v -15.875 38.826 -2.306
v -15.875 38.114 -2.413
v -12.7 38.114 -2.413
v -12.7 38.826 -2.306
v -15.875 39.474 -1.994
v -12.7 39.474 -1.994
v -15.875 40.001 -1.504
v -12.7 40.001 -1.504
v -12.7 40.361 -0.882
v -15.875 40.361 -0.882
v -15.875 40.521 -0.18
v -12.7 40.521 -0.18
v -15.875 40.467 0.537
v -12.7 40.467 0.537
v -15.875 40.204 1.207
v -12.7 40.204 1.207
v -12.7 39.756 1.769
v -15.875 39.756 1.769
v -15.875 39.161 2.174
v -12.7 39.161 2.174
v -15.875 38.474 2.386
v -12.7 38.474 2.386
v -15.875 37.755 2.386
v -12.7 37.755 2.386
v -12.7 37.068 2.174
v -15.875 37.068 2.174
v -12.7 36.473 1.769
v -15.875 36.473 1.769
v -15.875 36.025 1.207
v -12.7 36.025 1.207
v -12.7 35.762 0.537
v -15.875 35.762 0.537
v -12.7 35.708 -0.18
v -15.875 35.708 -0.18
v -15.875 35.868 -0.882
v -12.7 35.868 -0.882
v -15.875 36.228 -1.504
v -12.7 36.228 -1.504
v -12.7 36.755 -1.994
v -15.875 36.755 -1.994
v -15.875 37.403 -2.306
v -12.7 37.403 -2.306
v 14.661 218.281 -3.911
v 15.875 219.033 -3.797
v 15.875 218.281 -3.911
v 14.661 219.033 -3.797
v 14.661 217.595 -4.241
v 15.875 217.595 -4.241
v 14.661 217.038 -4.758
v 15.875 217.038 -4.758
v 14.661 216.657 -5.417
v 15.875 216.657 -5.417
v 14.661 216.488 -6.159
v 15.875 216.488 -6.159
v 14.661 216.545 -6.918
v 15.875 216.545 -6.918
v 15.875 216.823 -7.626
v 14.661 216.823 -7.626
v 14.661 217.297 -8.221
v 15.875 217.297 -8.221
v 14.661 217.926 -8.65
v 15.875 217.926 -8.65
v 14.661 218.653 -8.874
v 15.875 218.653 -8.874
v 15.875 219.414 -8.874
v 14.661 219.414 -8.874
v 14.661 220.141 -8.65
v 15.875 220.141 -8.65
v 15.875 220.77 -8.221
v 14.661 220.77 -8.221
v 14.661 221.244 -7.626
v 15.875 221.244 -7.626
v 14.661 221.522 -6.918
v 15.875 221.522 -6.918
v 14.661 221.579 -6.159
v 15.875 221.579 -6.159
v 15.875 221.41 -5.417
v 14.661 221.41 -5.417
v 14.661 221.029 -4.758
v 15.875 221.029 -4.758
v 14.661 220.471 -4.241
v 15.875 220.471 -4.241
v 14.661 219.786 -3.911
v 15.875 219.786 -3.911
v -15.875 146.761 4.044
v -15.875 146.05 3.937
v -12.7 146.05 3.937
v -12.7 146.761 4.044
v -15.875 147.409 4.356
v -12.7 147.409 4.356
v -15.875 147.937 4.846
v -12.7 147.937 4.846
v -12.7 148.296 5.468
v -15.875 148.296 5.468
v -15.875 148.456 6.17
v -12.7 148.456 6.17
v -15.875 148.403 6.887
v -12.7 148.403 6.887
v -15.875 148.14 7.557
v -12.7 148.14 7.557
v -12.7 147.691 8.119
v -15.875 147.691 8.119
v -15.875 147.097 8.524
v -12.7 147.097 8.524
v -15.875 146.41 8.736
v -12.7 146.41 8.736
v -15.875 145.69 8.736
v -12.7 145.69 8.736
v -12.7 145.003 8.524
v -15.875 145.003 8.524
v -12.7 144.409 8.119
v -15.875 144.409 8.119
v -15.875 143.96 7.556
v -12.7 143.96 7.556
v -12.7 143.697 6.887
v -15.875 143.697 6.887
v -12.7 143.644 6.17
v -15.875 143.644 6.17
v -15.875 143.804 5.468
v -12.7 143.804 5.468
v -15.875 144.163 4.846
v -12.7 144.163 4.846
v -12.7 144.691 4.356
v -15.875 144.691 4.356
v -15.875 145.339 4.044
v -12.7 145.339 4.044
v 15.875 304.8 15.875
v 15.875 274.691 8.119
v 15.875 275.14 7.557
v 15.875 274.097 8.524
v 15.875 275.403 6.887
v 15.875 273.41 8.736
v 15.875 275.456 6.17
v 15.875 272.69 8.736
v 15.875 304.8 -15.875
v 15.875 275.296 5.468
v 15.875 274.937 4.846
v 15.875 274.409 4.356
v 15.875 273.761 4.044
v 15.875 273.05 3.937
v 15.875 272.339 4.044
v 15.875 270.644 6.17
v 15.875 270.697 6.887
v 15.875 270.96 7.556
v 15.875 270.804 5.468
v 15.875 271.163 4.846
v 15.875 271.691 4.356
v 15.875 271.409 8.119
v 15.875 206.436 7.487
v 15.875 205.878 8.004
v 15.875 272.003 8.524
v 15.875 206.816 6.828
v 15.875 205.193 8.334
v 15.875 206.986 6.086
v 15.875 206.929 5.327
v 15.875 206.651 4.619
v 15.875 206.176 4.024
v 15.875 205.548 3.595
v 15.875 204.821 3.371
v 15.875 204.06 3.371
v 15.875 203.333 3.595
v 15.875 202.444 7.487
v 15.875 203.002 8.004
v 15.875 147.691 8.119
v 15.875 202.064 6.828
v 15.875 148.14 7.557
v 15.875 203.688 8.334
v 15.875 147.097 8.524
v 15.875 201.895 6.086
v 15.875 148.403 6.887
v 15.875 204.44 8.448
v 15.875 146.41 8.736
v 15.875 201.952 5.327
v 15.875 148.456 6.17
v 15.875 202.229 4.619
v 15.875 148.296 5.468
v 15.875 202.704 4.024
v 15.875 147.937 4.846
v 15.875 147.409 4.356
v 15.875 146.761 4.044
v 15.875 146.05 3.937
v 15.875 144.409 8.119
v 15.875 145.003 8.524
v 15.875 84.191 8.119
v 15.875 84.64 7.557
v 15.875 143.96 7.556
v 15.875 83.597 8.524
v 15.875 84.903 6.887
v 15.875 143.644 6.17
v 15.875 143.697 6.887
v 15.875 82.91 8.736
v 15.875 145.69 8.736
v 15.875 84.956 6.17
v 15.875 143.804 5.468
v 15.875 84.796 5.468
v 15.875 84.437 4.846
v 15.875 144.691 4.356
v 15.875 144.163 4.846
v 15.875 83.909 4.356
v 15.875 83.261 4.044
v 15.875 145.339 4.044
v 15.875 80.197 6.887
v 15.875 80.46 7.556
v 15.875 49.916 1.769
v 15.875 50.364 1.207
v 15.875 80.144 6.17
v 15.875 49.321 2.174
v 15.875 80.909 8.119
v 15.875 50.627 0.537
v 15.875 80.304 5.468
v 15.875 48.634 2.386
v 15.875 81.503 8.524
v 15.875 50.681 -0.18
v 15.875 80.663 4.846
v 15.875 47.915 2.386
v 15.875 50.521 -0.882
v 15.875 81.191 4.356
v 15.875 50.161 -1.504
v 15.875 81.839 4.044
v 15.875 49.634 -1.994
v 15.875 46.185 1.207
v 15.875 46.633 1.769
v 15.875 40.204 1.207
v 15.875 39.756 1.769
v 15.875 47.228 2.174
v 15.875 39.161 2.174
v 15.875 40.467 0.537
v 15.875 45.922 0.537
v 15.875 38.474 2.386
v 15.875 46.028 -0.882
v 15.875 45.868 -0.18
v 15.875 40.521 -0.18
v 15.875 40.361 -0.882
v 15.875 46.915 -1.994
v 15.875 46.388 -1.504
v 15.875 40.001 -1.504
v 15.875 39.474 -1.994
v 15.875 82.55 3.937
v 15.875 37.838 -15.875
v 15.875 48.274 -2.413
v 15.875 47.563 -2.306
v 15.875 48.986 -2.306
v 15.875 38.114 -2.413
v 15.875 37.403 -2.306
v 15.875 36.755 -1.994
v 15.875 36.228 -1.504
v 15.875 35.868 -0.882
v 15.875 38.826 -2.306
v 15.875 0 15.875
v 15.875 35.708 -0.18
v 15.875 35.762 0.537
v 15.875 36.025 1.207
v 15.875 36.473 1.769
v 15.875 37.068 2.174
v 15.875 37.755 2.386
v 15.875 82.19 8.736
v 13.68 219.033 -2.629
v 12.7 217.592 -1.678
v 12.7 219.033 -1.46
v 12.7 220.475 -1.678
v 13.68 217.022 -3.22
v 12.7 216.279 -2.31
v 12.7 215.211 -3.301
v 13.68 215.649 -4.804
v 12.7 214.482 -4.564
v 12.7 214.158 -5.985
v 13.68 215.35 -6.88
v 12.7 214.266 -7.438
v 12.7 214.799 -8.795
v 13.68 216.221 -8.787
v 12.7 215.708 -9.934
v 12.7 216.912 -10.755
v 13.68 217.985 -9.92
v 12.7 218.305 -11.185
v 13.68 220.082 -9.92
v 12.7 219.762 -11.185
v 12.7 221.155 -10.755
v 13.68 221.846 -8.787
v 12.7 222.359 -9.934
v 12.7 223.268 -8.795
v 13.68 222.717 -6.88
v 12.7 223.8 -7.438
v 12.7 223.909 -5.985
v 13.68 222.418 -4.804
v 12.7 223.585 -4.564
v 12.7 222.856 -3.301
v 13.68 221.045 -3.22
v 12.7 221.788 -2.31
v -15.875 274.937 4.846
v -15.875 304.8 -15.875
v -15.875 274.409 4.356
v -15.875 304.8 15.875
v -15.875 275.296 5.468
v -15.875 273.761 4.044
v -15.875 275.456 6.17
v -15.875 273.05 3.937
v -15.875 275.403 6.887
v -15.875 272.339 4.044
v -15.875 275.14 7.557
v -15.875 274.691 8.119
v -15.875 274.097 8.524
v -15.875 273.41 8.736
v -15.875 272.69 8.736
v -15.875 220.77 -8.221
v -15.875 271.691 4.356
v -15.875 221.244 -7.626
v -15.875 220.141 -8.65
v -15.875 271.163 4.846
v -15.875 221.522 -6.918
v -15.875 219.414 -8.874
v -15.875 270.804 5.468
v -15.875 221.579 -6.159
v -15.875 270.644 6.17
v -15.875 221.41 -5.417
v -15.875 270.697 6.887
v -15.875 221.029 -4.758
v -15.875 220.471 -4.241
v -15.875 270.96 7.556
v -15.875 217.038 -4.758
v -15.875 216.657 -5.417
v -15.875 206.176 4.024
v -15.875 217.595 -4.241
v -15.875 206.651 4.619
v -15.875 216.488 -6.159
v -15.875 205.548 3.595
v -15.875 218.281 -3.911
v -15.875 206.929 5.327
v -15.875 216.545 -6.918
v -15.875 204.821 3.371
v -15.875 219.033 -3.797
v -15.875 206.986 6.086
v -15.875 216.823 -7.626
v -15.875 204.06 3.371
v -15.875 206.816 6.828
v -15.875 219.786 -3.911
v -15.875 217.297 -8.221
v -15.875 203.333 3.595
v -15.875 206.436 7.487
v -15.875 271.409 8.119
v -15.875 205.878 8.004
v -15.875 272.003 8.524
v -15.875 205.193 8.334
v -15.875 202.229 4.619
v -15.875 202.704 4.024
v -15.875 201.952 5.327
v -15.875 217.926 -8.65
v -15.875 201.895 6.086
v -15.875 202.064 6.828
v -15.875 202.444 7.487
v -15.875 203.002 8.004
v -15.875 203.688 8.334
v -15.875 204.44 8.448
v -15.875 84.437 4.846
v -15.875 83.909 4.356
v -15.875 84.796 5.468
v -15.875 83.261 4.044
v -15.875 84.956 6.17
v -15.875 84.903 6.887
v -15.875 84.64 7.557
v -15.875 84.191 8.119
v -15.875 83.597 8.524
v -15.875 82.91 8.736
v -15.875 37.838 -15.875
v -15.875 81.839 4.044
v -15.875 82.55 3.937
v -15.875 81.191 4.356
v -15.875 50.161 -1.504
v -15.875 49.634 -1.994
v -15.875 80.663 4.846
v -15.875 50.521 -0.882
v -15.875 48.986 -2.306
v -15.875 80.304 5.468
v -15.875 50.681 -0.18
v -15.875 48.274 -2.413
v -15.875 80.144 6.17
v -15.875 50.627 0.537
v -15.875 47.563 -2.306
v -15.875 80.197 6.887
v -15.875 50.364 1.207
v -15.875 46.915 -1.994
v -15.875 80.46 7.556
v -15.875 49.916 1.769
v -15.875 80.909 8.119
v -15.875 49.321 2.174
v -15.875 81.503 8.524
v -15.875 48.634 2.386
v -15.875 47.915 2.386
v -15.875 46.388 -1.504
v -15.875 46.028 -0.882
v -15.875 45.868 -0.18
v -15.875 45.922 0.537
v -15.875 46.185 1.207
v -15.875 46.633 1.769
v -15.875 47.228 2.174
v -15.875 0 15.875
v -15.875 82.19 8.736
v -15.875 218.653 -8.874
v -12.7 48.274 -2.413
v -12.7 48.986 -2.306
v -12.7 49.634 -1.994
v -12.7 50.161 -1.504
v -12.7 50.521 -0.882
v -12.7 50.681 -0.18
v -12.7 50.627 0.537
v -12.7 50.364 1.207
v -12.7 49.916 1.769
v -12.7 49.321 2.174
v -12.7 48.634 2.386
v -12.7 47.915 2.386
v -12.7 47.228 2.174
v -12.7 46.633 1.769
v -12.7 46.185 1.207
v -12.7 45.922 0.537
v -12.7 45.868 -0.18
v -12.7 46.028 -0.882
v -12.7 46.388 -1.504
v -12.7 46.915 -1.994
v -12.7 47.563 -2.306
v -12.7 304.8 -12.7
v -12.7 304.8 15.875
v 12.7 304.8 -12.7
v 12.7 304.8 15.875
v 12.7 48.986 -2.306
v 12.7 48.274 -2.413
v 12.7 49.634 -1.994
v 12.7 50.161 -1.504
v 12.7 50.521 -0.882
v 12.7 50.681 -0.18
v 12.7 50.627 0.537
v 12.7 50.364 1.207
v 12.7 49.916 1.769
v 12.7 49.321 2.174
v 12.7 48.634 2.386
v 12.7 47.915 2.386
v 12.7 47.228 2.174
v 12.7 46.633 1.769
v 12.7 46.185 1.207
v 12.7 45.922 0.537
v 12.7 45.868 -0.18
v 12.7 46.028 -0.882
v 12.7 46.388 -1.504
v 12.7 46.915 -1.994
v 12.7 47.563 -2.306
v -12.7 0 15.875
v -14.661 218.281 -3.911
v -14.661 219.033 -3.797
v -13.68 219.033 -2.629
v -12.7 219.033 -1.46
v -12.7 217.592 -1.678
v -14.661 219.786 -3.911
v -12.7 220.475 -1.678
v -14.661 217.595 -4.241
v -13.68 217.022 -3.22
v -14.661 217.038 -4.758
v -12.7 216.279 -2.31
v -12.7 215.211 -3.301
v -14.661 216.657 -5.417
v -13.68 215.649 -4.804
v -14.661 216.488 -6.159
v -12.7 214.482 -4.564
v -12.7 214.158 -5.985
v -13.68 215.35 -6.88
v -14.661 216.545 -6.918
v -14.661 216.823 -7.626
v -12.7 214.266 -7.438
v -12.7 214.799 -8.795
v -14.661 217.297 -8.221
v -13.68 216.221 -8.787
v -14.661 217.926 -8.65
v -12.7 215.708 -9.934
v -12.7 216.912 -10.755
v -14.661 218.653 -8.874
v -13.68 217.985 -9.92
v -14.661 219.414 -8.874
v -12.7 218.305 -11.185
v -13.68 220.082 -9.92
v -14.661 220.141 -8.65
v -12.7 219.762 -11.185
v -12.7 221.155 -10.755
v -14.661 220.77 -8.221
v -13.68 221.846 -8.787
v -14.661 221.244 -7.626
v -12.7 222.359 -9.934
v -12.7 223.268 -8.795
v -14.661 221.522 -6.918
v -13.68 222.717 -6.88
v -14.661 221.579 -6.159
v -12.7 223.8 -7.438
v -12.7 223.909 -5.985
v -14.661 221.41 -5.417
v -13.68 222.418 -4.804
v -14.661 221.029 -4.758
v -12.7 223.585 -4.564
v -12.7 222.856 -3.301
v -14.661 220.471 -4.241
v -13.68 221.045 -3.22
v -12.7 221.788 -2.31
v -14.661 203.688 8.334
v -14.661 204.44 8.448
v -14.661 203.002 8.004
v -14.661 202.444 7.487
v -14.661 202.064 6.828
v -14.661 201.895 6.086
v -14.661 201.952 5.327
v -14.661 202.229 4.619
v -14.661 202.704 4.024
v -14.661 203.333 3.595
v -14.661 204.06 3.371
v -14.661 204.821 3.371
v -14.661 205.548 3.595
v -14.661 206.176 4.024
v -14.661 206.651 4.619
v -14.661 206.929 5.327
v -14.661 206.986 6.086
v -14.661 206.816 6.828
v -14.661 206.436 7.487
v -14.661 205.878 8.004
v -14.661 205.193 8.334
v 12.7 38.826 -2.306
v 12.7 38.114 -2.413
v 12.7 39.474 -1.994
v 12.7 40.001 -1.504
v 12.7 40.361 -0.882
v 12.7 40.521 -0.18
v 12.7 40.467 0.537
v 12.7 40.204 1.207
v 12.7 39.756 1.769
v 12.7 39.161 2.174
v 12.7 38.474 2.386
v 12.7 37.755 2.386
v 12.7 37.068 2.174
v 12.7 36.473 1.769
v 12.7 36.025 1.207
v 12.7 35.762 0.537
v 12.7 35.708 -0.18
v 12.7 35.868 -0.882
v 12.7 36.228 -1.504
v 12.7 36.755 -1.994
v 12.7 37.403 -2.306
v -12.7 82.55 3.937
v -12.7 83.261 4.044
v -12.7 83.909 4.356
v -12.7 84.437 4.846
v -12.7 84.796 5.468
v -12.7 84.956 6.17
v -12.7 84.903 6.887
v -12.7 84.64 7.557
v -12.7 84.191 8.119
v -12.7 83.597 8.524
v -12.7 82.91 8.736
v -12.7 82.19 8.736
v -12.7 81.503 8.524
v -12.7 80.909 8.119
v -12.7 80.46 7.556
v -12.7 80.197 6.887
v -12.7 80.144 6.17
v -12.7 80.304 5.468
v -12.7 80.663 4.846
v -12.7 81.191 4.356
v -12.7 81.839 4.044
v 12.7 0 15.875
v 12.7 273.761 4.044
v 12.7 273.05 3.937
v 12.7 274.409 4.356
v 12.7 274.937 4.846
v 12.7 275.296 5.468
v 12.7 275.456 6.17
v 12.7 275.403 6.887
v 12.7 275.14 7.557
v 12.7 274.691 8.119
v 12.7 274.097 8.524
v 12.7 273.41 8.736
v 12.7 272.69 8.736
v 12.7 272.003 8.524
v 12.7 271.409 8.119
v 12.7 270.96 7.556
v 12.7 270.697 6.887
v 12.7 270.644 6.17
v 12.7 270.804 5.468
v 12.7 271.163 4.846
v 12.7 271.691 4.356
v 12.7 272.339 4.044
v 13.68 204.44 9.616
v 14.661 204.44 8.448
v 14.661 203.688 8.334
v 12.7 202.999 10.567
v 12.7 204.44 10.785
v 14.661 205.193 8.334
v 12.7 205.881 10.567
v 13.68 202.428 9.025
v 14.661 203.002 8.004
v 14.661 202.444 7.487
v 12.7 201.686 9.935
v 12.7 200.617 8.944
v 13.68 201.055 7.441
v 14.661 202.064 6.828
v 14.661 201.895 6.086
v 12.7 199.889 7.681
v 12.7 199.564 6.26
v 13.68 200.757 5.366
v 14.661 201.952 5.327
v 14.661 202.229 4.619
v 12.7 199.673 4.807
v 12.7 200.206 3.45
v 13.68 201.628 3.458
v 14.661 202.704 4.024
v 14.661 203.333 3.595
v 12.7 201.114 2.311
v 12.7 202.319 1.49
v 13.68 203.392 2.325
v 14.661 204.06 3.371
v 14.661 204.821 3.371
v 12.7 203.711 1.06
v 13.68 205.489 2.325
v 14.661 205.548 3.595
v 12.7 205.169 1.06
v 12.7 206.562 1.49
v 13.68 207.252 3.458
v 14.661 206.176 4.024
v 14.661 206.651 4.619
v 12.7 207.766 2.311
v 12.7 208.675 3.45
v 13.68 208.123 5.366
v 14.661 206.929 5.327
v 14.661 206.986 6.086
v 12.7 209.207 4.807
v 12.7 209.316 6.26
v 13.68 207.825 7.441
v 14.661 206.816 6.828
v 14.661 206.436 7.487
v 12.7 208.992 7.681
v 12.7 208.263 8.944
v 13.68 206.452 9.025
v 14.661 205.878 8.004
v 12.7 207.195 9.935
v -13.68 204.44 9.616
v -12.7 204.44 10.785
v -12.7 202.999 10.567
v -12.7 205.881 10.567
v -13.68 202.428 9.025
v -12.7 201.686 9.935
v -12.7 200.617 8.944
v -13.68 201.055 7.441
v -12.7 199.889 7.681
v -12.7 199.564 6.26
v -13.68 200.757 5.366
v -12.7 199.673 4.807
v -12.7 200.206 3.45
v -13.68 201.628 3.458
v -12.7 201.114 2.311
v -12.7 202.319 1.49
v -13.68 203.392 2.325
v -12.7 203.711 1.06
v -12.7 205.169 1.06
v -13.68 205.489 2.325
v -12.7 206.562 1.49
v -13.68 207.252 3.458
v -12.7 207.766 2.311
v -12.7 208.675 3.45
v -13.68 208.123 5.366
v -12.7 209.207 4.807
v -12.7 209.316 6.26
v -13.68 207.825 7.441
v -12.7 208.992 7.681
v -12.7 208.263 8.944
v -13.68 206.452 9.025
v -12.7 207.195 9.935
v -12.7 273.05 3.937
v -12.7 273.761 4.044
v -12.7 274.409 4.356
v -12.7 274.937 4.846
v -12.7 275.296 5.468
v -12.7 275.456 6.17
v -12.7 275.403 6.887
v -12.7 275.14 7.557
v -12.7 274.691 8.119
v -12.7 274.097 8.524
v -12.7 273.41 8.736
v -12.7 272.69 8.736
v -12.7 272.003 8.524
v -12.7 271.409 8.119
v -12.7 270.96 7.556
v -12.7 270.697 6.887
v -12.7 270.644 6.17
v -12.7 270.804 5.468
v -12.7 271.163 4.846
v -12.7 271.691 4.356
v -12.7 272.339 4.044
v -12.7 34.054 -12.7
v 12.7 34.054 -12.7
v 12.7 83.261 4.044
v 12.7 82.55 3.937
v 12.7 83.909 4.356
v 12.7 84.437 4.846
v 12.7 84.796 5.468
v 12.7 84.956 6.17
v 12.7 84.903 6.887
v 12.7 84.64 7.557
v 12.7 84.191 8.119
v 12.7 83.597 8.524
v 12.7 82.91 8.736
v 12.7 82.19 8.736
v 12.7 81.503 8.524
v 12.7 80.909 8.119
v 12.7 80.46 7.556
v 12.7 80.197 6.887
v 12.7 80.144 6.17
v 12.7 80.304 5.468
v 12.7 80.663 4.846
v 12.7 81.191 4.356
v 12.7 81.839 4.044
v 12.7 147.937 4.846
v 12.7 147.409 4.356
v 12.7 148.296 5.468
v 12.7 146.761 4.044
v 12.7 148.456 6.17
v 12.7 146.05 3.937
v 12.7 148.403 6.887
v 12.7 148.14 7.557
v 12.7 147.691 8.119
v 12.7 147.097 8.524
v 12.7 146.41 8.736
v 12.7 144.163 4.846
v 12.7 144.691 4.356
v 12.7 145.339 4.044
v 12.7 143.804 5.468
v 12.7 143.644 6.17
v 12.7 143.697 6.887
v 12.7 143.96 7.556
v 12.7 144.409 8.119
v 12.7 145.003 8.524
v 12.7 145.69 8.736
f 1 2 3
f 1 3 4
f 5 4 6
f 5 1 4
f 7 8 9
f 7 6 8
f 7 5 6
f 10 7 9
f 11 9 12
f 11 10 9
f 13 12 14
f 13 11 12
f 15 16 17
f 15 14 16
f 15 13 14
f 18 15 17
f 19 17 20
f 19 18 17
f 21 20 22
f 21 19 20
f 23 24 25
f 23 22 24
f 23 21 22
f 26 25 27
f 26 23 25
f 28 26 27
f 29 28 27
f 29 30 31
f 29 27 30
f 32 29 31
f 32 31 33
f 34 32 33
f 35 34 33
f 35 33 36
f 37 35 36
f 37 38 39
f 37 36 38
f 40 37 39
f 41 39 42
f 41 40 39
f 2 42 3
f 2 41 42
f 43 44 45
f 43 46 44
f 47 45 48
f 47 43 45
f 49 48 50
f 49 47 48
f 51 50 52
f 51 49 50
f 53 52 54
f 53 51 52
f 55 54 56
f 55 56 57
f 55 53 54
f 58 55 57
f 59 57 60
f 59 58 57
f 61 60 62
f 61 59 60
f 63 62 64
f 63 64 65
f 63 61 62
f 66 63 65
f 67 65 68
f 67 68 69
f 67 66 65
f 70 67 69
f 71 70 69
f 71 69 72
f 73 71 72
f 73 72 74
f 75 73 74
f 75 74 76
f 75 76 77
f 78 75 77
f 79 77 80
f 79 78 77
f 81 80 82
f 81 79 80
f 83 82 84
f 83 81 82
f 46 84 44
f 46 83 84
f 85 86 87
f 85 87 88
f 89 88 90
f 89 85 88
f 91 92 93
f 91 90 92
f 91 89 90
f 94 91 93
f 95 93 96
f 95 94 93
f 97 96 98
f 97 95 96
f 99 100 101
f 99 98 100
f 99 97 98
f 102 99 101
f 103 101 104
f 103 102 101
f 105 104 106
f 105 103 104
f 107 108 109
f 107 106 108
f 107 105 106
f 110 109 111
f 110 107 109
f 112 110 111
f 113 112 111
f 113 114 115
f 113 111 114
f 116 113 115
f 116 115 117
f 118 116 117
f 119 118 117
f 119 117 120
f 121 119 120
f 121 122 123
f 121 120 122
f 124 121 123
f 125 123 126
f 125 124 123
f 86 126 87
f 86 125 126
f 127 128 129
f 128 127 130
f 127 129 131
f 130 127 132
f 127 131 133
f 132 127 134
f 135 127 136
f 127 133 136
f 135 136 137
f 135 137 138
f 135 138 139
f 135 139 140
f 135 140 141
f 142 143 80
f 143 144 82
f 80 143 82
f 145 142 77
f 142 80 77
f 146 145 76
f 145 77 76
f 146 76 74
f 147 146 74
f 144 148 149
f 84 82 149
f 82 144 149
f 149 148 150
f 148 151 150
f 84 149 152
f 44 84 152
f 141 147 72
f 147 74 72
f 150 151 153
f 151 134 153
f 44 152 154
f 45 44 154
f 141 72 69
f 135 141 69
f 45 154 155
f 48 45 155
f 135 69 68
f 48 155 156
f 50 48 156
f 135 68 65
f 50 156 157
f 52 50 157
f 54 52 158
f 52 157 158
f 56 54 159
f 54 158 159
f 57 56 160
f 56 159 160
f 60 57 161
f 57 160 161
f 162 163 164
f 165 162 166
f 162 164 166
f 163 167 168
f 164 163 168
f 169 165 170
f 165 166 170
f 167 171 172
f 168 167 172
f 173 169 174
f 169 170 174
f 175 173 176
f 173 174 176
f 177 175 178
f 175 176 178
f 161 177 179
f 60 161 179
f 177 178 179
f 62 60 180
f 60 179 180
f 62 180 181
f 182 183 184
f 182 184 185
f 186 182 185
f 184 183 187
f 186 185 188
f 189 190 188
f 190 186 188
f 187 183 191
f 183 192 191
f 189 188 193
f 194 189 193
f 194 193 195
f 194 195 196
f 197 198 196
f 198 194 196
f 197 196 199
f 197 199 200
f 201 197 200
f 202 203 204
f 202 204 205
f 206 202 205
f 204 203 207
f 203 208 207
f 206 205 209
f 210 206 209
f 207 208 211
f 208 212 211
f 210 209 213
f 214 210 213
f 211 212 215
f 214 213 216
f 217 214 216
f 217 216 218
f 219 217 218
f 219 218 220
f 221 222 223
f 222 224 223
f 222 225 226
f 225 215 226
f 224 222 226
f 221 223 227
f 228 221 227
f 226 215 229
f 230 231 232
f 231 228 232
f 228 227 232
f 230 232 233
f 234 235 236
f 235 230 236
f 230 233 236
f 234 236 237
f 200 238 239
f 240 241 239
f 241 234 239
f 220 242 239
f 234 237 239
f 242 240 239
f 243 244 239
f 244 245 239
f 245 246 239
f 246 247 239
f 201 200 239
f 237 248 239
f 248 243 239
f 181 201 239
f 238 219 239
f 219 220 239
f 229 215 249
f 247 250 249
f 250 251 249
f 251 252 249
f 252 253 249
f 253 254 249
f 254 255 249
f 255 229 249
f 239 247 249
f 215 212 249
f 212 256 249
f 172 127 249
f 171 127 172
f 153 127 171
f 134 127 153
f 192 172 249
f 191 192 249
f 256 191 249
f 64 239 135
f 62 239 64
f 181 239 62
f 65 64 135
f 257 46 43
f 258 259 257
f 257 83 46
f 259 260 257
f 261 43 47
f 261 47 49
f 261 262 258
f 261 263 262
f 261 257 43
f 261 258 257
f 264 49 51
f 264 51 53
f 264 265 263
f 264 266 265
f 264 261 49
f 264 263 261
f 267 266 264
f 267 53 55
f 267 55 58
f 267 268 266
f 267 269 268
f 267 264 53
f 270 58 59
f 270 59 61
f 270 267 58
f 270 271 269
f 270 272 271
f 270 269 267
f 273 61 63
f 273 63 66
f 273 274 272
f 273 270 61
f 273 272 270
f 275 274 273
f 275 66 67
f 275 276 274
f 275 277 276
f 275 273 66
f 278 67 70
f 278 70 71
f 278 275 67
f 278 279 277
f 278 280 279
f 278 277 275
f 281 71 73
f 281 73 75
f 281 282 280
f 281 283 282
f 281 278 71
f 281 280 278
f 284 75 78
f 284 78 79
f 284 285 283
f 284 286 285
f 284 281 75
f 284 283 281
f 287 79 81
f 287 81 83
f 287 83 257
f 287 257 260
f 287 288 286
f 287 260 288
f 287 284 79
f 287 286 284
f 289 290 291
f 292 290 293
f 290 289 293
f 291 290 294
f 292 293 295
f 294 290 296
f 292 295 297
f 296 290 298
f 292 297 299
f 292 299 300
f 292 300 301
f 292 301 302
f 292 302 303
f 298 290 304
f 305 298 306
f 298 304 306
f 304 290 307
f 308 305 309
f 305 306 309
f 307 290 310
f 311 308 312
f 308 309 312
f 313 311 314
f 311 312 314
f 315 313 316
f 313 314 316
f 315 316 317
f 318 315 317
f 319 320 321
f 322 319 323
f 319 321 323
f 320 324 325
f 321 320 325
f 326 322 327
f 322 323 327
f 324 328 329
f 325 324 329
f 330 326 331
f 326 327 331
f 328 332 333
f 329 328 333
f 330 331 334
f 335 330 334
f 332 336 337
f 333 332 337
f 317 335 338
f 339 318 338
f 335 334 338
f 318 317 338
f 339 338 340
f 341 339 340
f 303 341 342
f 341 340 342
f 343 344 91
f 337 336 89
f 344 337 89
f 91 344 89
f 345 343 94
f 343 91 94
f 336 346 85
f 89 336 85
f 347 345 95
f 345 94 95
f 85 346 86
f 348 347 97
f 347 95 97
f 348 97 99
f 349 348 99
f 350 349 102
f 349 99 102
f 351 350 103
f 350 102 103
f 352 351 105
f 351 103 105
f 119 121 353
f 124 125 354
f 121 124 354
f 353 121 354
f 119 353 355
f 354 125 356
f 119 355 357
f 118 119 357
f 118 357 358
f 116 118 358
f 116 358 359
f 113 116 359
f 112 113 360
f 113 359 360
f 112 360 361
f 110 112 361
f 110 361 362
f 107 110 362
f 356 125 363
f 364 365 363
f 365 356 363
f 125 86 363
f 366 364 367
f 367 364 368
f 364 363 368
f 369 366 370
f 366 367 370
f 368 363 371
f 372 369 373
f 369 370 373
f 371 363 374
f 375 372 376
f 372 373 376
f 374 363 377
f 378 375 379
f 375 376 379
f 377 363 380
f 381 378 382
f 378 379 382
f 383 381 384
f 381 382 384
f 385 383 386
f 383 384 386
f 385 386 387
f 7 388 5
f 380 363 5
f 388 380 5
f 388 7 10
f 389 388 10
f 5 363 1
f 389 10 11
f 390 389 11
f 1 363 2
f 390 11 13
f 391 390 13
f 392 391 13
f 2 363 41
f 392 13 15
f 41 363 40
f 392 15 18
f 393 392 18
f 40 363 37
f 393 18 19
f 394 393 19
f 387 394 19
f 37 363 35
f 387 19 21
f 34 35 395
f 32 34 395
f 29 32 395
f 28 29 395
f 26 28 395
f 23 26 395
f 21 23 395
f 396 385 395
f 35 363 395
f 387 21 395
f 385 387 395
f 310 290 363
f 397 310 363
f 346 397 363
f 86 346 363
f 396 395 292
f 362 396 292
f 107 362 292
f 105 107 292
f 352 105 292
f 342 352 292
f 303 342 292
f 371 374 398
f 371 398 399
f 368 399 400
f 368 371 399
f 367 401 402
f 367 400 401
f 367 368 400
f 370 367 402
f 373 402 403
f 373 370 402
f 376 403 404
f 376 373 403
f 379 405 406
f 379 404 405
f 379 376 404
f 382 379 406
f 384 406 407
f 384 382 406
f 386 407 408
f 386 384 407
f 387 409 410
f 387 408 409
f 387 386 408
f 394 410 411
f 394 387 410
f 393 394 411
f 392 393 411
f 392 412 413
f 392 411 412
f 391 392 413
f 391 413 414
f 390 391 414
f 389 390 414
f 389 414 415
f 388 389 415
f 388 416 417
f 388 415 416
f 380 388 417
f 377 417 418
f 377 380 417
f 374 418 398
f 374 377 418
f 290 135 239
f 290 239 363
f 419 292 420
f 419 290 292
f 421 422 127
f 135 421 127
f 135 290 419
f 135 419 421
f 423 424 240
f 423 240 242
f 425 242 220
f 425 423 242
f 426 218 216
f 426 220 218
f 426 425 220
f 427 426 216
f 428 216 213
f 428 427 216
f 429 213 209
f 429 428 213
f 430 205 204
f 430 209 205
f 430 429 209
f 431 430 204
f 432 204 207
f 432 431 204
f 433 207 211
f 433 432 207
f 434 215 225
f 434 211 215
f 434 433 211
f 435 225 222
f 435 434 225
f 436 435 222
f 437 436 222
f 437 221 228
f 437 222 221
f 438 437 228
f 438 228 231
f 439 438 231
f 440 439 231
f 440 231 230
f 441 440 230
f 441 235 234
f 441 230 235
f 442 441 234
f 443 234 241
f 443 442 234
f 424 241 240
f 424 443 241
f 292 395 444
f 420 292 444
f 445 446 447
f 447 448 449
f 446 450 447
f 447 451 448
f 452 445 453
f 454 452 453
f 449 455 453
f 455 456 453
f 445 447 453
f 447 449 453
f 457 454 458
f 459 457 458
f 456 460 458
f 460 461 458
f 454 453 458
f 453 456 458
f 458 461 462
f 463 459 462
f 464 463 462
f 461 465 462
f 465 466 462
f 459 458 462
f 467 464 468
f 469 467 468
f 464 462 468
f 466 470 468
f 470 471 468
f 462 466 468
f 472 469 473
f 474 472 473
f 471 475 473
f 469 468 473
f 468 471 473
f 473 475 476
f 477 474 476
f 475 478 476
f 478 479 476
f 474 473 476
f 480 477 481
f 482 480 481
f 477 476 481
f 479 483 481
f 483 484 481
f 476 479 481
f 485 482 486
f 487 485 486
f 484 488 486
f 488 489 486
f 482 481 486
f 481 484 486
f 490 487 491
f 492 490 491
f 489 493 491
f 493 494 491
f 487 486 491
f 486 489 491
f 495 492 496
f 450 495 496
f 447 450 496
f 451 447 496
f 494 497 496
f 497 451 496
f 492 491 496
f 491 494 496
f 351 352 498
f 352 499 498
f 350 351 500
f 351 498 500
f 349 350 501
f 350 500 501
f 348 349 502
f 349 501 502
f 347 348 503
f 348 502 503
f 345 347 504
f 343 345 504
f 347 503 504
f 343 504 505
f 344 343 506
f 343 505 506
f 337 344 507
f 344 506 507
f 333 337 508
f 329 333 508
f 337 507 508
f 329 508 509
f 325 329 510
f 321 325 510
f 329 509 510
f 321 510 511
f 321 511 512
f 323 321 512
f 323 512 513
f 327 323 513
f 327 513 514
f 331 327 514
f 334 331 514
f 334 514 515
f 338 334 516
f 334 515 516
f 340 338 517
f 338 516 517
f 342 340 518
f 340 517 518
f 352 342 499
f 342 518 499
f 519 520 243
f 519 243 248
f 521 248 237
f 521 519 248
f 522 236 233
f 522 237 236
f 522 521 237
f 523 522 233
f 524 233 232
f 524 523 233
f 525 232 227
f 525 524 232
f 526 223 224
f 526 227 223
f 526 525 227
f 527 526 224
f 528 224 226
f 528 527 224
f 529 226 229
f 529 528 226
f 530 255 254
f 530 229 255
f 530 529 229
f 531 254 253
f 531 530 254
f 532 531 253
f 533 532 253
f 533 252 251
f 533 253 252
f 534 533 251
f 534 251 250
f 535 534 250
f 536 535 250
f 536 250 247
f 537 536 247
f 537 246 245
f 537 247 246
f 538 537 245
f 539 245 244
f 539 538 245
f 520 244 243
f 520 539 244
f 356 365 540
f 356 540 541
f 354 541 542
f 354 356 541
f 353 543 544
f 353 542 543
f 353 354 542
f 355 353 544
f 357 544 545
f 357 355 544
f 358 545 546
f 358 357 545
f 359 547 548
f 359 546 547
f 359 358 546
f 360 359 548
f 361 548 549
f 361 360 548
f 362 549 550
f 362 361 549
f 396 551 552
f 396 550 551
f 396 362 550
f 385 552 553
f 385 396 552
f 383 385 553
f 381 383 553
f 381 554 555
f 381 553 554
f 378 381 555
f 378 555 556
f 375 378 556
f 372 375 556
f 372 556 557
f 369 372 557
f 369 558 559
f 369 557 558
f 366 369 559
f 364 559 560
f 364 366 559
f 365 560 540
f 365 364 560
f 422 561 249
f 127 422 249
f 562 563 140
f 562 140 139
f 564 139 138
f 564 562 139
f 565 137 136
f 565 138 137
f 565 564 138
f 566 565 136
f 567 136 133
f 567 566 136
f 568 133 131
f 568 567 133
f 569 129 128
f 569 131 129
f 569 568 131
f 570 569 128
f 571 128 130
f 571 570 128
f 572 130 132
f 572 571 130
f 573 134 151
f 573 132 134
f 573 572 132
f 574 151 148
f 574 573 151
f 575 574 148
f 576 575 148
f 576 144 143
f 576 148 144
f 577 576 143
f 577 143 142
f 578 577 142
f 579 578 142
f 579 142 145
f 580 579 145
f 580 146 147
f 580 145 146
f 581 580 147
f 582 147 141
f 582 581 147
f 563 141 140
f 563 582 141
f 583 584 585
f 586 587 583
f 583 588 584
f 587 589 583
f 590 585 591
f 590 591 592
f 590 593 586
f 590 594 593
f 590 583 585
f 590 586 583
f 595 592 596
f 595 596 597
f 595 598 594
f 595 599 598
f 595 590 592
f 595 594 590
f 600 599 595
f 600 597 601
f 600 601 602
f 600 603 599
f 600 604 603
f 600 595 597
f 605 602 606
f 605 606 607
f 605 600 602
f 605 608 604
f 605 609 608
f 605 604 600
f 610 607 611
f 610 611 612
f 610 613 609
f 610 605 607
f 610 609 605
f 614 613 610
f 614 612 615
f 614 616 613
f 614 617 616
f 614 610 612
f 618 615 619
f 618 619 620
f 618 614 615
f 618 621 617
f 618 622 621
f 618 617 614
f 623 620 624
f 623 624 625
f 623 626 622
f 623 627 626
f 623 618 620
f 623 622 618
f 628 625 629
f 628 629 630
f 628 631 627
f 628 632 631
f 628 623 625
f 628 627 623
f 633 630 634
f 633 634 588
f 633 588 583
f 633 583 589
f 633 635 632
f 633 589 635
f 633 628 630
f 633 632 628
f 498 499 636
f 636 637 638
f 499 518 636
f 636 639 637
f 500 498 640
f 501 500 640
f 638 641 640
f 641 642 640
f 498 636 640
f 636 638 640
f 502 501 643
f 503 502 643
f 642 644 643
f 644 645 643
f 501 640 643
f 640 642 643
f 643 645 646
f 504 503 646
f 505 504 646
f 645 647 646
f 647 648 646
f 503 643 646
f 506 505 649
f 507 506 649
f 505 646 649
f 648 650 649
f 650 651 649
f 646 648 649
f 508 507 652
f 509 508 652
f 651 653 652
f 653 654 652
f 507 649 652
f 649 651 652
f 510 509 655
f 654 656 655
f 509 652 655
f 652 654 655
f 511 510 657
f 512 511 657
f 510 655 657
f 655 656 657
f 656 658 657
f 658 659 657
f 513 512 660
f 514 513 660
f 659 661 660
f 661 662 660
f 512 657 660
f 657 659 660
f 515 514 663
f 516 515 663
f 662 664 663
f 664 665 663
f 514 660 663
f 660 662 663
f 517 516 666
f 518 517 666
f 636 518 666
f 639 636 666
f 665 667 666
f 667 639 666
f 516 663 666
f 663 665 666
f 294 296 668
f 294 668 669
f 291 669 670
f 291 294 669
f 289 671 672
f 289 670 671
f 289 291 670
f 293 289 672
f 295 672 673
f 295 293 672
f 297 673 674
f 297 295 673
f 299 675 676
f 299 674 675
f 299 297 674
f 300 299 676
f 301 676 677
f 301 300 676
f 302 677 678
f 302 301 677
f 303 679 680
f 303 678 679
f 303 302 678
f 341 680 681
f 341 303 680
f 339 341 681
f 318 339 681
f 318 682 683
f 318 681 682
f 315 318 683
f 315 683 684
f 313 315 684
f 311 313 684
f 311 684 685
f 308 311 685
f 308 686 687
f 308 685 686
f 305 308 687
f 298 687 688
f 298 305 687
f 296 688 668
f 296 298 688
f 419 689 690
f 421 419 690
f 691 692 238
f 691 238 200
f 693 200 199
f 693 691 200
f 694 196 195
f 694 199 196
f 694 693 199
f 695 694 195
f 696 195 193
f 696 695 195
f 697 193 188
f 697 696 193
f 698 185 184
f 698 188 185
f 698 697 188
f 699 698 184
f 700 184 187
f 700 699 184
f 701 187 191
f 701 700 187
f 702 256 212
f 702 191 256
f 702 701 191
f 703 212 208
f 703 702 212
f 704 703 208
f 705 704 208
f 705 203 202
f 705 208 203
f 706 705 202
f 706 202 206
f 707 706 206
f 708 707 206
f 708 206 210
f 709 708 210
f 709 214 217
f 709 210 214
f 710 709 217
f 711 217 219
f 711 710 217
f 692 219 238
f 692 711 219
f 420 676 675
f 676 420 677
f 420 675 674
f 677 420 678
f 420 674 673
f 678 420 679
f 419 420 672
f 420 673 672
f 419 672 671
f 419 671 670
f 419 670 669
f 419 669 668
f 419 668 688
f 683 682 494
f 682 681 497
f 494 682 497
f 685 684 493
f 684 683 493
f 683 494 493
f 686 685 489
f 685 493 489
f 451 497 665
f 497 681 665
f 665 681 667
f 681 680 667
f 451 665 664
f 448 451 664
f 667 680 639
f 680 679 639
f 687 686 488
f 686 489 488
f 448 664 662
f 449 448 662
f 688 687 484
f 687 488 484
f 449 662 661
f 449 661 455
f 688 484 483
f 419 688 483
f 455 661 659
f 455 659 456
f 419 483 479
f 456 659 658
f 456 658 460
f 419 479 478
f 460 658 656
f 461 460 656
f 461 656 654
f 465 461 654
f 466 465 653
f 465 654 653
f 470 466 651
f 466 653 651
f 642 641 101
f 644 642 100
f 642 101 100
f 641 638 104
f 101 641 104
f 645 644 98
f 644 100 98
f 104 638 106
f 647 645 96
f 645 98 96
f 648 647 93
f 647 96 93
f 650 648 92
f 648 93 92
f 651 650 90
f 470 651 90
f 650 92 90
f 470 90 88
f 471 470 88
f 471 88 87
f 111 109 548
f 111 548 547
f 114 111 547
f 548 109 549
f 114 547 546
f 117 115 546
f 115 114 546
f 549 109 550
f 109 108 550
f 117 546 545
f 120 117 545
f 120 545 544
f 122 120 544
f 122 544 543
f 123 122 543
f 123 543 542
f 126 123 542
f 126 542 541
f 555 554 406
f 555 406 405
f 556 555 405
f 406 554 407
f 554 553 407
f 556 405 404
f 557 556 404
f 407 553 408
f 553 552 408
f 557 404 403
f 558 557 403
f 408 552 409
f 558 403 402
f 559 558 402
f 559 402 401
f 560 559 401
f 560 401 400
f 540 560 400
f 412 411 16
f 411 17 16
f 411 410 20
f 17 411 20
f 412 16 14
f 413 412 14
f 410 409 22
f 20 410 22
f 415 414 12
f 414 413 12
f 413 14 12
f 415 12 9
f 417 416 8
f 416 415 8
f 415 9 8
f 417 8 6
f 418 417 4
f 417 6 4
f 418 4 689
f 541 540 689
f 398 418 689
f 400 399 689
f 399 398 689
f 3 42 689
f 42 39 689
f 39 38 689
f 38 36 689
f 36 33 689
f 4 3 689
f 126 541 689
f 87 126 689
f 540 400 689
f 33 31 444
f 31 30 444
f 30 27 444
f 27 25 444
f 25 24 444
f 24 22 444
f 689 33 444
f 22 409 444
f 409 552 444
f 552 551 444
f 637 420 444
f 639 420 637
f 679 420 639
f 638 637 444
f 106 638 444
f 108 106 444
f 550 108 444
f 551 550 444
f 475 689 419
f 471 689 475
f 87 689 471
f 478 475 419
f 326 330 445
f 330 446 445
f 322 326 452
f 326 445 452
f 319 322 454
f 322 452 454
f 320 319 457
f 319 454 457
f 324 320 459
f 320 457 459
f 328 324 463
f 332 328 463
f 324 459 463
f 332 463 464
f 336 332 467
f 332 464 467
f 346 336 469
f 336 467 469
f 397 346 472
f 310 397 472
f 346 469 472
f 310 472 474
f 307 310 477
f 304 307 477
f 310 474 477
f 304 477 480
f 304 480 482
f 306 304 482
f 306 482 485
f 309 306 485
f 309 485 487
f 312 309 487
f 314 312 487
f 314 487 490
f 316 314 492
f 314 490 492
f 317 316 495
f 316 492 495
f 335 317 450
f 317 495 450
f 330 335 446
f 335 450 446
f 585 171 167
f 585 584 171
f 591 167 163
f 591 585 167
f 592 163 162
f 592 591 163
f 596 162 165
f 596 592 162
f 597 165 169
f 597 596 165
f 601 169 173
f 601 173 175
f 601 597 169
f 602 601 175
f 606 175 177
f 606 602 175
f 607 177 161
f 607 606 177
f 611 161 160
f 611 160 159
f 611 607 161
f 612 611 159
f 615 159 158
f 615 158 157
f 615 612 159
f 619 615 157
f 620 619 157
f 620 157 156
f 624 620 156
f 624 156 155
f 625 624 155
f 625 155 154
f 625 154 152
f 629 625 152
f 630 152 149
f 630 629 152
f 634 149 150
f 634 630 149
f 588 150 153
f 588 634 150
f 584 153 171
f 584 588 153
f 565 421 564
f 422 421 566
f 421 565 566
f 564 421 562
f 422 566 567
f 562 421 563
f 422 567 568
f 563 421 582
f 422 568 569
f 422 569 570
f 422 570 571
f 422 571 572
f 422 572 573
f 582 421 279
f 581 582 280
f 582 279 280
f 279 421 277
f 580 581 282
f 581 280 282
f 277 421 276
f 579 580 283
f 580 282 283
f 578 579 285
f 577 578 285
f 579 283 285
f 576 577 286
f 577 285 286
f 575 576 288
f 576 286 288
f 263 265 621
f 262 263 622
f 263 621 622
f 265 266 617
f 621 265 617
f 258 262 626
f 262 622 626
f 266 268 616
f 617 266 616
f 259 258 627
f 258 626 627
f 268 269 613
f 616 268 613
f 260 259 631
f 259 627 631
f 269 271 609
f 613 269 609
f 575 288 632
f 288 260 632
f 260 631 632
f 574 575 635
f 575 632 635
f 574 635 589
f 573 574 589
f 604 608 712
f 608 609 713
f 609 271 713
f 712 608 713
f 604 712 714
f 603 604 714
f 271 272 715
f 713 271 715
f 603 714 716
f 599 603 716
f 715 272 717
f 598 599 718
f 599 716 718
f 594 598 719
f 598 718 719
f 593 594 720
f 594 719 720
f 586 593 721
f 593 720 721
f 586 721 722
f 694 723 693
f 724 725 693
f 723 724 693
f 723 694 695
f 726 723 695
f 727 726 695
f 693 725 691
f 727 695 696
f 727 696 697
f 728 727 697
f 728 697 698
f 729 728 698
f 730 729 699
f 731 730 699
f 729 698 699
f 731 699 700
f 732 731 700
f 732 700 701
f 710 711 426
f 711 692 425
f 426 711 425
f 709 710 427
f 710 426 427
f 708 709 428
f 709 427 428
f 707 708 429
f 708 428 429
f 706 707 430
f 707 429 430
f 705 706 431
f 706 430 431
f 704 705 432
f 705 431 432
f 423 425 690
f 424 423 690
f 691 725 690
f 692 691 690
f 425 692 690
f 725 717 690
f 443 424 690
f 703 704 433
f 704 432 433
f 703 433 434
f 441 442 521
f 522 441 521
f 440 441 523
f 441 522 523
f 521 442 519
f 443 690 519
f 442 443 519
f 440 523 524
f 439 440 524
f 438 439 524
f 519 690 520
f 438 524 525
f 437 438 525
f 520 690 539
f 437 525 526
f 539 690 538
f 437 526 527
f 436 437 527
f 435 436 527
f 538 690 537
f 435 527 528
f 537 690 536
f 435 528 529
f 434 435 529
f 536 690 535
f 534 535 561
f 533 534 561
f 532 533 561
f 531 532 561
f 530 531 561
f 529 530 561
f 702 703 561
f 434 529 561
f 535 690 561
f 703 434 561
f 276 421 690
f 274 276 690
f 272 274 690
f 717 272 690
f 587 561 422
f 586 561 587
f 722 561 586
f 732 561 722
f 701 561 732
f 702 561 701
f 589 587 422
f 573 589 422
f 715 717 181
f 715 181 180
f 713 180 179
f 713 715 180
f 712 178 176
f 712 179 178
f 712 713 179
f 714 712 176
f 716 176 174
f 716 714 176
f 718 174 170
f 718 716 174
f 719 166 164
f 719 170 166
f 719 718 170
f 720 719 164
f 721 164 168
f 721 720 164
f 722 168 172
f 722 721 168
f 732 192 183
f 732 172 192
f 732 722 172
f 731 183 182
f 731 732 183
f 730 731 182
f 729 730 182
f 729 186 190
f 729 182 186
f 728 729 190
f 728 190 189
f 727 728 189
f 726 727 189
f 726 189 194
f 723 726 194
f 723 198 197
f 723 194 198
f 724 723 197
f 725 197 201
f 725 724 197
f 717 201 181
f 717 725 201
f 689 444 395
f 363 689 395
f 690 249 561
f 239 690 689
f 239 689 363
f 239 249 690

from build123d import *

# Parameters (mm, degrees)
BOSS_EXTRUDE1_DEPTH                        = 304.8
CUT_EXTRUDE1_DEPTH                         = 307.860095361
CUT_EXTRUDE2_DEPTH                         = 307.860095361
CUT_EXTRUDE2_DEPTH_BACK                    = 307.860095361
SKETCH3_R                                  = 2.413
CUT_EXTRUDE3_DEPTH                         = 307.860095361
CUT_EXTRUDE3_DEPTH_BACK                    = 307.860095361
SKETCH4_R                                  = 2.413
CSK_FOR_10_FLAT_HEAD_MACHINE_SCREW_2_COUNT = 2
CSK_FOR_10_FLAT_HEAD_MACHINE_SCREW_2_PITCH = 19.05


with BuildPart() as part:
    # Sketch1 → Boss-Extrude1 (new body)
    with BuildSketch(Plane(origin=(0, 0, 0), x_dir=(1, 0, 0), z_dir=(0, 1, 0))):
        Polygon((-15.875, -15.875), (-12.7, -15.875), (-12.7, 12.7), (12.7, 12.7), (12.7, -15.875), (15.875, -15.875), (15.875, 15.875), (-15.875, 15.875), align=None)
    extrude(amount=BOSS_EXTRUDE1_DEPTH)

    # Sketch2 → Cut-Extrude1 (cut, through all)
    with BuildSketch(Plane(origin=(15.875, 0, 0), x_dir=(0, 0, -1), z_dir=(1, 0, 0))):
        Polygon((-15.875, 0), (15.875, 37.838176565), (15.875, 0), align=None)
    extrude(amount=-CUT_EXTRUDE1_DEPTH, mode=Mode.SUBTRACT)

    # Sketch3 → Cut-Extrude2 (cut, two sides: drawn at the far end of the back side and taken through both)
    with BuildSketch(Plane(origin=(15.875, 0, 0), x_dir=(0, 0, -1), z_dir=(1, 0, 0)).offset(-CUT_EXTRUDE2_DEPTH_BACK)):
        with Locations((-6.35, 273.05)):
            Circle(SKETCH3_R)
        with Locations((-6.35, 82.55)):
            Circle(SKETCH3_R)
        with Locations((-6.35, 146.05)):
            Circle(SKETCH3_R)
    extrude(amount=CUT_EXTRUDE2_DEPTH + CUT_EXTRUDE2_DEPTH_BACK, mode=Mode.SUBTRACT)

    # Sketch4 → Cut-Extrude3 (cut, two sides: drawn at the far end of the back side and taken through both)
    with BuildSketch(Plane(origin=(15.875, 0, 0), x_dir=(0, 0, -1), z_dir=(1, 0, 0)).offset(-CUT_EXTRUDE3_DEPTH_BACK)):
        with Locations((0, 48.274473485)):
            Circle(SKETCH4_R)
        with Locations((0, 38.114473485)):
            Circle(SKETCH4_R)
    extrude(amount=CUT_EXTRUDE3_DEPTH + CUT_EXTRUDE3_DEPTH_BACK, mode=Mode.SUBTRACT)

    # Sketch11 → CSK for #10 Flat Head Machine Screw (100)1 (revolve, cut)
    with BuildSketch(Plane(origin=(12.7, 219.033346522, -6.35), x_dir=(0, 0, 1), z_dir=(0, 1, 0))):
        Polygon((0, 0), (0, 3.175), (2.5527, 3.175), (2.5527, 1.960808018), (4.8895, 0), align=None)
    csk_for_10_flat_head_machine_screw_100 = revolve(axis=Axis((6.35, 219.033346522, -6.35), (1, 0, 0)), mode=Mode.SUBTRACT)

    # CSK for _10 Flat Head Machine Screw  2: CSK for #10 Flat Head Machine Screw (100)1 ×2
    with Locations(*[Vector(0, -0.766044443118978, 0.6427876096865395) * (i * CSK_FOR_10_FLAT_HEAD_MACHINE_SCREW_2_PITCH) for i in range(1, CSK_FOR_10_FLAT_HEAD_MACHINE_SCREW_2_COUNT)]):
        add(csk_for_10_flat_head_machine_screw_100, mode=Mode.SUBTRACT)

    # Mirror4: CSK for #10 Flat Head Machine Screw (100)1 across plane
    add(csk_for_10_flat_head_machine_screw_100.mirror(Plane(origin=(0, 0, 0), x_dir=(0, 0, 1), z_dir=(1, 0, 0))), mode=Mode.SUBTRACT)

    # Mirror4 copy 1 sketch → Mirror4 copy 1 (revolve, cut)
    with BuildSketch(Plane(origin=(-12.7, 204.440199881, 5.895103965), x_dir=(0, 0, 1), z_dir=(0, 1, 0))):
        Polygon((0, 0), (0, -3.175), (2.5527, -3.175), (2.5527, -1.960808018), (4.8895, 0), align=None)
    revolve(axis=Axis((-6.35, 204.440199881, 5.895103965), (1, 0, 0)), mode=Mode.SUBTRACT)


solid = part.part
